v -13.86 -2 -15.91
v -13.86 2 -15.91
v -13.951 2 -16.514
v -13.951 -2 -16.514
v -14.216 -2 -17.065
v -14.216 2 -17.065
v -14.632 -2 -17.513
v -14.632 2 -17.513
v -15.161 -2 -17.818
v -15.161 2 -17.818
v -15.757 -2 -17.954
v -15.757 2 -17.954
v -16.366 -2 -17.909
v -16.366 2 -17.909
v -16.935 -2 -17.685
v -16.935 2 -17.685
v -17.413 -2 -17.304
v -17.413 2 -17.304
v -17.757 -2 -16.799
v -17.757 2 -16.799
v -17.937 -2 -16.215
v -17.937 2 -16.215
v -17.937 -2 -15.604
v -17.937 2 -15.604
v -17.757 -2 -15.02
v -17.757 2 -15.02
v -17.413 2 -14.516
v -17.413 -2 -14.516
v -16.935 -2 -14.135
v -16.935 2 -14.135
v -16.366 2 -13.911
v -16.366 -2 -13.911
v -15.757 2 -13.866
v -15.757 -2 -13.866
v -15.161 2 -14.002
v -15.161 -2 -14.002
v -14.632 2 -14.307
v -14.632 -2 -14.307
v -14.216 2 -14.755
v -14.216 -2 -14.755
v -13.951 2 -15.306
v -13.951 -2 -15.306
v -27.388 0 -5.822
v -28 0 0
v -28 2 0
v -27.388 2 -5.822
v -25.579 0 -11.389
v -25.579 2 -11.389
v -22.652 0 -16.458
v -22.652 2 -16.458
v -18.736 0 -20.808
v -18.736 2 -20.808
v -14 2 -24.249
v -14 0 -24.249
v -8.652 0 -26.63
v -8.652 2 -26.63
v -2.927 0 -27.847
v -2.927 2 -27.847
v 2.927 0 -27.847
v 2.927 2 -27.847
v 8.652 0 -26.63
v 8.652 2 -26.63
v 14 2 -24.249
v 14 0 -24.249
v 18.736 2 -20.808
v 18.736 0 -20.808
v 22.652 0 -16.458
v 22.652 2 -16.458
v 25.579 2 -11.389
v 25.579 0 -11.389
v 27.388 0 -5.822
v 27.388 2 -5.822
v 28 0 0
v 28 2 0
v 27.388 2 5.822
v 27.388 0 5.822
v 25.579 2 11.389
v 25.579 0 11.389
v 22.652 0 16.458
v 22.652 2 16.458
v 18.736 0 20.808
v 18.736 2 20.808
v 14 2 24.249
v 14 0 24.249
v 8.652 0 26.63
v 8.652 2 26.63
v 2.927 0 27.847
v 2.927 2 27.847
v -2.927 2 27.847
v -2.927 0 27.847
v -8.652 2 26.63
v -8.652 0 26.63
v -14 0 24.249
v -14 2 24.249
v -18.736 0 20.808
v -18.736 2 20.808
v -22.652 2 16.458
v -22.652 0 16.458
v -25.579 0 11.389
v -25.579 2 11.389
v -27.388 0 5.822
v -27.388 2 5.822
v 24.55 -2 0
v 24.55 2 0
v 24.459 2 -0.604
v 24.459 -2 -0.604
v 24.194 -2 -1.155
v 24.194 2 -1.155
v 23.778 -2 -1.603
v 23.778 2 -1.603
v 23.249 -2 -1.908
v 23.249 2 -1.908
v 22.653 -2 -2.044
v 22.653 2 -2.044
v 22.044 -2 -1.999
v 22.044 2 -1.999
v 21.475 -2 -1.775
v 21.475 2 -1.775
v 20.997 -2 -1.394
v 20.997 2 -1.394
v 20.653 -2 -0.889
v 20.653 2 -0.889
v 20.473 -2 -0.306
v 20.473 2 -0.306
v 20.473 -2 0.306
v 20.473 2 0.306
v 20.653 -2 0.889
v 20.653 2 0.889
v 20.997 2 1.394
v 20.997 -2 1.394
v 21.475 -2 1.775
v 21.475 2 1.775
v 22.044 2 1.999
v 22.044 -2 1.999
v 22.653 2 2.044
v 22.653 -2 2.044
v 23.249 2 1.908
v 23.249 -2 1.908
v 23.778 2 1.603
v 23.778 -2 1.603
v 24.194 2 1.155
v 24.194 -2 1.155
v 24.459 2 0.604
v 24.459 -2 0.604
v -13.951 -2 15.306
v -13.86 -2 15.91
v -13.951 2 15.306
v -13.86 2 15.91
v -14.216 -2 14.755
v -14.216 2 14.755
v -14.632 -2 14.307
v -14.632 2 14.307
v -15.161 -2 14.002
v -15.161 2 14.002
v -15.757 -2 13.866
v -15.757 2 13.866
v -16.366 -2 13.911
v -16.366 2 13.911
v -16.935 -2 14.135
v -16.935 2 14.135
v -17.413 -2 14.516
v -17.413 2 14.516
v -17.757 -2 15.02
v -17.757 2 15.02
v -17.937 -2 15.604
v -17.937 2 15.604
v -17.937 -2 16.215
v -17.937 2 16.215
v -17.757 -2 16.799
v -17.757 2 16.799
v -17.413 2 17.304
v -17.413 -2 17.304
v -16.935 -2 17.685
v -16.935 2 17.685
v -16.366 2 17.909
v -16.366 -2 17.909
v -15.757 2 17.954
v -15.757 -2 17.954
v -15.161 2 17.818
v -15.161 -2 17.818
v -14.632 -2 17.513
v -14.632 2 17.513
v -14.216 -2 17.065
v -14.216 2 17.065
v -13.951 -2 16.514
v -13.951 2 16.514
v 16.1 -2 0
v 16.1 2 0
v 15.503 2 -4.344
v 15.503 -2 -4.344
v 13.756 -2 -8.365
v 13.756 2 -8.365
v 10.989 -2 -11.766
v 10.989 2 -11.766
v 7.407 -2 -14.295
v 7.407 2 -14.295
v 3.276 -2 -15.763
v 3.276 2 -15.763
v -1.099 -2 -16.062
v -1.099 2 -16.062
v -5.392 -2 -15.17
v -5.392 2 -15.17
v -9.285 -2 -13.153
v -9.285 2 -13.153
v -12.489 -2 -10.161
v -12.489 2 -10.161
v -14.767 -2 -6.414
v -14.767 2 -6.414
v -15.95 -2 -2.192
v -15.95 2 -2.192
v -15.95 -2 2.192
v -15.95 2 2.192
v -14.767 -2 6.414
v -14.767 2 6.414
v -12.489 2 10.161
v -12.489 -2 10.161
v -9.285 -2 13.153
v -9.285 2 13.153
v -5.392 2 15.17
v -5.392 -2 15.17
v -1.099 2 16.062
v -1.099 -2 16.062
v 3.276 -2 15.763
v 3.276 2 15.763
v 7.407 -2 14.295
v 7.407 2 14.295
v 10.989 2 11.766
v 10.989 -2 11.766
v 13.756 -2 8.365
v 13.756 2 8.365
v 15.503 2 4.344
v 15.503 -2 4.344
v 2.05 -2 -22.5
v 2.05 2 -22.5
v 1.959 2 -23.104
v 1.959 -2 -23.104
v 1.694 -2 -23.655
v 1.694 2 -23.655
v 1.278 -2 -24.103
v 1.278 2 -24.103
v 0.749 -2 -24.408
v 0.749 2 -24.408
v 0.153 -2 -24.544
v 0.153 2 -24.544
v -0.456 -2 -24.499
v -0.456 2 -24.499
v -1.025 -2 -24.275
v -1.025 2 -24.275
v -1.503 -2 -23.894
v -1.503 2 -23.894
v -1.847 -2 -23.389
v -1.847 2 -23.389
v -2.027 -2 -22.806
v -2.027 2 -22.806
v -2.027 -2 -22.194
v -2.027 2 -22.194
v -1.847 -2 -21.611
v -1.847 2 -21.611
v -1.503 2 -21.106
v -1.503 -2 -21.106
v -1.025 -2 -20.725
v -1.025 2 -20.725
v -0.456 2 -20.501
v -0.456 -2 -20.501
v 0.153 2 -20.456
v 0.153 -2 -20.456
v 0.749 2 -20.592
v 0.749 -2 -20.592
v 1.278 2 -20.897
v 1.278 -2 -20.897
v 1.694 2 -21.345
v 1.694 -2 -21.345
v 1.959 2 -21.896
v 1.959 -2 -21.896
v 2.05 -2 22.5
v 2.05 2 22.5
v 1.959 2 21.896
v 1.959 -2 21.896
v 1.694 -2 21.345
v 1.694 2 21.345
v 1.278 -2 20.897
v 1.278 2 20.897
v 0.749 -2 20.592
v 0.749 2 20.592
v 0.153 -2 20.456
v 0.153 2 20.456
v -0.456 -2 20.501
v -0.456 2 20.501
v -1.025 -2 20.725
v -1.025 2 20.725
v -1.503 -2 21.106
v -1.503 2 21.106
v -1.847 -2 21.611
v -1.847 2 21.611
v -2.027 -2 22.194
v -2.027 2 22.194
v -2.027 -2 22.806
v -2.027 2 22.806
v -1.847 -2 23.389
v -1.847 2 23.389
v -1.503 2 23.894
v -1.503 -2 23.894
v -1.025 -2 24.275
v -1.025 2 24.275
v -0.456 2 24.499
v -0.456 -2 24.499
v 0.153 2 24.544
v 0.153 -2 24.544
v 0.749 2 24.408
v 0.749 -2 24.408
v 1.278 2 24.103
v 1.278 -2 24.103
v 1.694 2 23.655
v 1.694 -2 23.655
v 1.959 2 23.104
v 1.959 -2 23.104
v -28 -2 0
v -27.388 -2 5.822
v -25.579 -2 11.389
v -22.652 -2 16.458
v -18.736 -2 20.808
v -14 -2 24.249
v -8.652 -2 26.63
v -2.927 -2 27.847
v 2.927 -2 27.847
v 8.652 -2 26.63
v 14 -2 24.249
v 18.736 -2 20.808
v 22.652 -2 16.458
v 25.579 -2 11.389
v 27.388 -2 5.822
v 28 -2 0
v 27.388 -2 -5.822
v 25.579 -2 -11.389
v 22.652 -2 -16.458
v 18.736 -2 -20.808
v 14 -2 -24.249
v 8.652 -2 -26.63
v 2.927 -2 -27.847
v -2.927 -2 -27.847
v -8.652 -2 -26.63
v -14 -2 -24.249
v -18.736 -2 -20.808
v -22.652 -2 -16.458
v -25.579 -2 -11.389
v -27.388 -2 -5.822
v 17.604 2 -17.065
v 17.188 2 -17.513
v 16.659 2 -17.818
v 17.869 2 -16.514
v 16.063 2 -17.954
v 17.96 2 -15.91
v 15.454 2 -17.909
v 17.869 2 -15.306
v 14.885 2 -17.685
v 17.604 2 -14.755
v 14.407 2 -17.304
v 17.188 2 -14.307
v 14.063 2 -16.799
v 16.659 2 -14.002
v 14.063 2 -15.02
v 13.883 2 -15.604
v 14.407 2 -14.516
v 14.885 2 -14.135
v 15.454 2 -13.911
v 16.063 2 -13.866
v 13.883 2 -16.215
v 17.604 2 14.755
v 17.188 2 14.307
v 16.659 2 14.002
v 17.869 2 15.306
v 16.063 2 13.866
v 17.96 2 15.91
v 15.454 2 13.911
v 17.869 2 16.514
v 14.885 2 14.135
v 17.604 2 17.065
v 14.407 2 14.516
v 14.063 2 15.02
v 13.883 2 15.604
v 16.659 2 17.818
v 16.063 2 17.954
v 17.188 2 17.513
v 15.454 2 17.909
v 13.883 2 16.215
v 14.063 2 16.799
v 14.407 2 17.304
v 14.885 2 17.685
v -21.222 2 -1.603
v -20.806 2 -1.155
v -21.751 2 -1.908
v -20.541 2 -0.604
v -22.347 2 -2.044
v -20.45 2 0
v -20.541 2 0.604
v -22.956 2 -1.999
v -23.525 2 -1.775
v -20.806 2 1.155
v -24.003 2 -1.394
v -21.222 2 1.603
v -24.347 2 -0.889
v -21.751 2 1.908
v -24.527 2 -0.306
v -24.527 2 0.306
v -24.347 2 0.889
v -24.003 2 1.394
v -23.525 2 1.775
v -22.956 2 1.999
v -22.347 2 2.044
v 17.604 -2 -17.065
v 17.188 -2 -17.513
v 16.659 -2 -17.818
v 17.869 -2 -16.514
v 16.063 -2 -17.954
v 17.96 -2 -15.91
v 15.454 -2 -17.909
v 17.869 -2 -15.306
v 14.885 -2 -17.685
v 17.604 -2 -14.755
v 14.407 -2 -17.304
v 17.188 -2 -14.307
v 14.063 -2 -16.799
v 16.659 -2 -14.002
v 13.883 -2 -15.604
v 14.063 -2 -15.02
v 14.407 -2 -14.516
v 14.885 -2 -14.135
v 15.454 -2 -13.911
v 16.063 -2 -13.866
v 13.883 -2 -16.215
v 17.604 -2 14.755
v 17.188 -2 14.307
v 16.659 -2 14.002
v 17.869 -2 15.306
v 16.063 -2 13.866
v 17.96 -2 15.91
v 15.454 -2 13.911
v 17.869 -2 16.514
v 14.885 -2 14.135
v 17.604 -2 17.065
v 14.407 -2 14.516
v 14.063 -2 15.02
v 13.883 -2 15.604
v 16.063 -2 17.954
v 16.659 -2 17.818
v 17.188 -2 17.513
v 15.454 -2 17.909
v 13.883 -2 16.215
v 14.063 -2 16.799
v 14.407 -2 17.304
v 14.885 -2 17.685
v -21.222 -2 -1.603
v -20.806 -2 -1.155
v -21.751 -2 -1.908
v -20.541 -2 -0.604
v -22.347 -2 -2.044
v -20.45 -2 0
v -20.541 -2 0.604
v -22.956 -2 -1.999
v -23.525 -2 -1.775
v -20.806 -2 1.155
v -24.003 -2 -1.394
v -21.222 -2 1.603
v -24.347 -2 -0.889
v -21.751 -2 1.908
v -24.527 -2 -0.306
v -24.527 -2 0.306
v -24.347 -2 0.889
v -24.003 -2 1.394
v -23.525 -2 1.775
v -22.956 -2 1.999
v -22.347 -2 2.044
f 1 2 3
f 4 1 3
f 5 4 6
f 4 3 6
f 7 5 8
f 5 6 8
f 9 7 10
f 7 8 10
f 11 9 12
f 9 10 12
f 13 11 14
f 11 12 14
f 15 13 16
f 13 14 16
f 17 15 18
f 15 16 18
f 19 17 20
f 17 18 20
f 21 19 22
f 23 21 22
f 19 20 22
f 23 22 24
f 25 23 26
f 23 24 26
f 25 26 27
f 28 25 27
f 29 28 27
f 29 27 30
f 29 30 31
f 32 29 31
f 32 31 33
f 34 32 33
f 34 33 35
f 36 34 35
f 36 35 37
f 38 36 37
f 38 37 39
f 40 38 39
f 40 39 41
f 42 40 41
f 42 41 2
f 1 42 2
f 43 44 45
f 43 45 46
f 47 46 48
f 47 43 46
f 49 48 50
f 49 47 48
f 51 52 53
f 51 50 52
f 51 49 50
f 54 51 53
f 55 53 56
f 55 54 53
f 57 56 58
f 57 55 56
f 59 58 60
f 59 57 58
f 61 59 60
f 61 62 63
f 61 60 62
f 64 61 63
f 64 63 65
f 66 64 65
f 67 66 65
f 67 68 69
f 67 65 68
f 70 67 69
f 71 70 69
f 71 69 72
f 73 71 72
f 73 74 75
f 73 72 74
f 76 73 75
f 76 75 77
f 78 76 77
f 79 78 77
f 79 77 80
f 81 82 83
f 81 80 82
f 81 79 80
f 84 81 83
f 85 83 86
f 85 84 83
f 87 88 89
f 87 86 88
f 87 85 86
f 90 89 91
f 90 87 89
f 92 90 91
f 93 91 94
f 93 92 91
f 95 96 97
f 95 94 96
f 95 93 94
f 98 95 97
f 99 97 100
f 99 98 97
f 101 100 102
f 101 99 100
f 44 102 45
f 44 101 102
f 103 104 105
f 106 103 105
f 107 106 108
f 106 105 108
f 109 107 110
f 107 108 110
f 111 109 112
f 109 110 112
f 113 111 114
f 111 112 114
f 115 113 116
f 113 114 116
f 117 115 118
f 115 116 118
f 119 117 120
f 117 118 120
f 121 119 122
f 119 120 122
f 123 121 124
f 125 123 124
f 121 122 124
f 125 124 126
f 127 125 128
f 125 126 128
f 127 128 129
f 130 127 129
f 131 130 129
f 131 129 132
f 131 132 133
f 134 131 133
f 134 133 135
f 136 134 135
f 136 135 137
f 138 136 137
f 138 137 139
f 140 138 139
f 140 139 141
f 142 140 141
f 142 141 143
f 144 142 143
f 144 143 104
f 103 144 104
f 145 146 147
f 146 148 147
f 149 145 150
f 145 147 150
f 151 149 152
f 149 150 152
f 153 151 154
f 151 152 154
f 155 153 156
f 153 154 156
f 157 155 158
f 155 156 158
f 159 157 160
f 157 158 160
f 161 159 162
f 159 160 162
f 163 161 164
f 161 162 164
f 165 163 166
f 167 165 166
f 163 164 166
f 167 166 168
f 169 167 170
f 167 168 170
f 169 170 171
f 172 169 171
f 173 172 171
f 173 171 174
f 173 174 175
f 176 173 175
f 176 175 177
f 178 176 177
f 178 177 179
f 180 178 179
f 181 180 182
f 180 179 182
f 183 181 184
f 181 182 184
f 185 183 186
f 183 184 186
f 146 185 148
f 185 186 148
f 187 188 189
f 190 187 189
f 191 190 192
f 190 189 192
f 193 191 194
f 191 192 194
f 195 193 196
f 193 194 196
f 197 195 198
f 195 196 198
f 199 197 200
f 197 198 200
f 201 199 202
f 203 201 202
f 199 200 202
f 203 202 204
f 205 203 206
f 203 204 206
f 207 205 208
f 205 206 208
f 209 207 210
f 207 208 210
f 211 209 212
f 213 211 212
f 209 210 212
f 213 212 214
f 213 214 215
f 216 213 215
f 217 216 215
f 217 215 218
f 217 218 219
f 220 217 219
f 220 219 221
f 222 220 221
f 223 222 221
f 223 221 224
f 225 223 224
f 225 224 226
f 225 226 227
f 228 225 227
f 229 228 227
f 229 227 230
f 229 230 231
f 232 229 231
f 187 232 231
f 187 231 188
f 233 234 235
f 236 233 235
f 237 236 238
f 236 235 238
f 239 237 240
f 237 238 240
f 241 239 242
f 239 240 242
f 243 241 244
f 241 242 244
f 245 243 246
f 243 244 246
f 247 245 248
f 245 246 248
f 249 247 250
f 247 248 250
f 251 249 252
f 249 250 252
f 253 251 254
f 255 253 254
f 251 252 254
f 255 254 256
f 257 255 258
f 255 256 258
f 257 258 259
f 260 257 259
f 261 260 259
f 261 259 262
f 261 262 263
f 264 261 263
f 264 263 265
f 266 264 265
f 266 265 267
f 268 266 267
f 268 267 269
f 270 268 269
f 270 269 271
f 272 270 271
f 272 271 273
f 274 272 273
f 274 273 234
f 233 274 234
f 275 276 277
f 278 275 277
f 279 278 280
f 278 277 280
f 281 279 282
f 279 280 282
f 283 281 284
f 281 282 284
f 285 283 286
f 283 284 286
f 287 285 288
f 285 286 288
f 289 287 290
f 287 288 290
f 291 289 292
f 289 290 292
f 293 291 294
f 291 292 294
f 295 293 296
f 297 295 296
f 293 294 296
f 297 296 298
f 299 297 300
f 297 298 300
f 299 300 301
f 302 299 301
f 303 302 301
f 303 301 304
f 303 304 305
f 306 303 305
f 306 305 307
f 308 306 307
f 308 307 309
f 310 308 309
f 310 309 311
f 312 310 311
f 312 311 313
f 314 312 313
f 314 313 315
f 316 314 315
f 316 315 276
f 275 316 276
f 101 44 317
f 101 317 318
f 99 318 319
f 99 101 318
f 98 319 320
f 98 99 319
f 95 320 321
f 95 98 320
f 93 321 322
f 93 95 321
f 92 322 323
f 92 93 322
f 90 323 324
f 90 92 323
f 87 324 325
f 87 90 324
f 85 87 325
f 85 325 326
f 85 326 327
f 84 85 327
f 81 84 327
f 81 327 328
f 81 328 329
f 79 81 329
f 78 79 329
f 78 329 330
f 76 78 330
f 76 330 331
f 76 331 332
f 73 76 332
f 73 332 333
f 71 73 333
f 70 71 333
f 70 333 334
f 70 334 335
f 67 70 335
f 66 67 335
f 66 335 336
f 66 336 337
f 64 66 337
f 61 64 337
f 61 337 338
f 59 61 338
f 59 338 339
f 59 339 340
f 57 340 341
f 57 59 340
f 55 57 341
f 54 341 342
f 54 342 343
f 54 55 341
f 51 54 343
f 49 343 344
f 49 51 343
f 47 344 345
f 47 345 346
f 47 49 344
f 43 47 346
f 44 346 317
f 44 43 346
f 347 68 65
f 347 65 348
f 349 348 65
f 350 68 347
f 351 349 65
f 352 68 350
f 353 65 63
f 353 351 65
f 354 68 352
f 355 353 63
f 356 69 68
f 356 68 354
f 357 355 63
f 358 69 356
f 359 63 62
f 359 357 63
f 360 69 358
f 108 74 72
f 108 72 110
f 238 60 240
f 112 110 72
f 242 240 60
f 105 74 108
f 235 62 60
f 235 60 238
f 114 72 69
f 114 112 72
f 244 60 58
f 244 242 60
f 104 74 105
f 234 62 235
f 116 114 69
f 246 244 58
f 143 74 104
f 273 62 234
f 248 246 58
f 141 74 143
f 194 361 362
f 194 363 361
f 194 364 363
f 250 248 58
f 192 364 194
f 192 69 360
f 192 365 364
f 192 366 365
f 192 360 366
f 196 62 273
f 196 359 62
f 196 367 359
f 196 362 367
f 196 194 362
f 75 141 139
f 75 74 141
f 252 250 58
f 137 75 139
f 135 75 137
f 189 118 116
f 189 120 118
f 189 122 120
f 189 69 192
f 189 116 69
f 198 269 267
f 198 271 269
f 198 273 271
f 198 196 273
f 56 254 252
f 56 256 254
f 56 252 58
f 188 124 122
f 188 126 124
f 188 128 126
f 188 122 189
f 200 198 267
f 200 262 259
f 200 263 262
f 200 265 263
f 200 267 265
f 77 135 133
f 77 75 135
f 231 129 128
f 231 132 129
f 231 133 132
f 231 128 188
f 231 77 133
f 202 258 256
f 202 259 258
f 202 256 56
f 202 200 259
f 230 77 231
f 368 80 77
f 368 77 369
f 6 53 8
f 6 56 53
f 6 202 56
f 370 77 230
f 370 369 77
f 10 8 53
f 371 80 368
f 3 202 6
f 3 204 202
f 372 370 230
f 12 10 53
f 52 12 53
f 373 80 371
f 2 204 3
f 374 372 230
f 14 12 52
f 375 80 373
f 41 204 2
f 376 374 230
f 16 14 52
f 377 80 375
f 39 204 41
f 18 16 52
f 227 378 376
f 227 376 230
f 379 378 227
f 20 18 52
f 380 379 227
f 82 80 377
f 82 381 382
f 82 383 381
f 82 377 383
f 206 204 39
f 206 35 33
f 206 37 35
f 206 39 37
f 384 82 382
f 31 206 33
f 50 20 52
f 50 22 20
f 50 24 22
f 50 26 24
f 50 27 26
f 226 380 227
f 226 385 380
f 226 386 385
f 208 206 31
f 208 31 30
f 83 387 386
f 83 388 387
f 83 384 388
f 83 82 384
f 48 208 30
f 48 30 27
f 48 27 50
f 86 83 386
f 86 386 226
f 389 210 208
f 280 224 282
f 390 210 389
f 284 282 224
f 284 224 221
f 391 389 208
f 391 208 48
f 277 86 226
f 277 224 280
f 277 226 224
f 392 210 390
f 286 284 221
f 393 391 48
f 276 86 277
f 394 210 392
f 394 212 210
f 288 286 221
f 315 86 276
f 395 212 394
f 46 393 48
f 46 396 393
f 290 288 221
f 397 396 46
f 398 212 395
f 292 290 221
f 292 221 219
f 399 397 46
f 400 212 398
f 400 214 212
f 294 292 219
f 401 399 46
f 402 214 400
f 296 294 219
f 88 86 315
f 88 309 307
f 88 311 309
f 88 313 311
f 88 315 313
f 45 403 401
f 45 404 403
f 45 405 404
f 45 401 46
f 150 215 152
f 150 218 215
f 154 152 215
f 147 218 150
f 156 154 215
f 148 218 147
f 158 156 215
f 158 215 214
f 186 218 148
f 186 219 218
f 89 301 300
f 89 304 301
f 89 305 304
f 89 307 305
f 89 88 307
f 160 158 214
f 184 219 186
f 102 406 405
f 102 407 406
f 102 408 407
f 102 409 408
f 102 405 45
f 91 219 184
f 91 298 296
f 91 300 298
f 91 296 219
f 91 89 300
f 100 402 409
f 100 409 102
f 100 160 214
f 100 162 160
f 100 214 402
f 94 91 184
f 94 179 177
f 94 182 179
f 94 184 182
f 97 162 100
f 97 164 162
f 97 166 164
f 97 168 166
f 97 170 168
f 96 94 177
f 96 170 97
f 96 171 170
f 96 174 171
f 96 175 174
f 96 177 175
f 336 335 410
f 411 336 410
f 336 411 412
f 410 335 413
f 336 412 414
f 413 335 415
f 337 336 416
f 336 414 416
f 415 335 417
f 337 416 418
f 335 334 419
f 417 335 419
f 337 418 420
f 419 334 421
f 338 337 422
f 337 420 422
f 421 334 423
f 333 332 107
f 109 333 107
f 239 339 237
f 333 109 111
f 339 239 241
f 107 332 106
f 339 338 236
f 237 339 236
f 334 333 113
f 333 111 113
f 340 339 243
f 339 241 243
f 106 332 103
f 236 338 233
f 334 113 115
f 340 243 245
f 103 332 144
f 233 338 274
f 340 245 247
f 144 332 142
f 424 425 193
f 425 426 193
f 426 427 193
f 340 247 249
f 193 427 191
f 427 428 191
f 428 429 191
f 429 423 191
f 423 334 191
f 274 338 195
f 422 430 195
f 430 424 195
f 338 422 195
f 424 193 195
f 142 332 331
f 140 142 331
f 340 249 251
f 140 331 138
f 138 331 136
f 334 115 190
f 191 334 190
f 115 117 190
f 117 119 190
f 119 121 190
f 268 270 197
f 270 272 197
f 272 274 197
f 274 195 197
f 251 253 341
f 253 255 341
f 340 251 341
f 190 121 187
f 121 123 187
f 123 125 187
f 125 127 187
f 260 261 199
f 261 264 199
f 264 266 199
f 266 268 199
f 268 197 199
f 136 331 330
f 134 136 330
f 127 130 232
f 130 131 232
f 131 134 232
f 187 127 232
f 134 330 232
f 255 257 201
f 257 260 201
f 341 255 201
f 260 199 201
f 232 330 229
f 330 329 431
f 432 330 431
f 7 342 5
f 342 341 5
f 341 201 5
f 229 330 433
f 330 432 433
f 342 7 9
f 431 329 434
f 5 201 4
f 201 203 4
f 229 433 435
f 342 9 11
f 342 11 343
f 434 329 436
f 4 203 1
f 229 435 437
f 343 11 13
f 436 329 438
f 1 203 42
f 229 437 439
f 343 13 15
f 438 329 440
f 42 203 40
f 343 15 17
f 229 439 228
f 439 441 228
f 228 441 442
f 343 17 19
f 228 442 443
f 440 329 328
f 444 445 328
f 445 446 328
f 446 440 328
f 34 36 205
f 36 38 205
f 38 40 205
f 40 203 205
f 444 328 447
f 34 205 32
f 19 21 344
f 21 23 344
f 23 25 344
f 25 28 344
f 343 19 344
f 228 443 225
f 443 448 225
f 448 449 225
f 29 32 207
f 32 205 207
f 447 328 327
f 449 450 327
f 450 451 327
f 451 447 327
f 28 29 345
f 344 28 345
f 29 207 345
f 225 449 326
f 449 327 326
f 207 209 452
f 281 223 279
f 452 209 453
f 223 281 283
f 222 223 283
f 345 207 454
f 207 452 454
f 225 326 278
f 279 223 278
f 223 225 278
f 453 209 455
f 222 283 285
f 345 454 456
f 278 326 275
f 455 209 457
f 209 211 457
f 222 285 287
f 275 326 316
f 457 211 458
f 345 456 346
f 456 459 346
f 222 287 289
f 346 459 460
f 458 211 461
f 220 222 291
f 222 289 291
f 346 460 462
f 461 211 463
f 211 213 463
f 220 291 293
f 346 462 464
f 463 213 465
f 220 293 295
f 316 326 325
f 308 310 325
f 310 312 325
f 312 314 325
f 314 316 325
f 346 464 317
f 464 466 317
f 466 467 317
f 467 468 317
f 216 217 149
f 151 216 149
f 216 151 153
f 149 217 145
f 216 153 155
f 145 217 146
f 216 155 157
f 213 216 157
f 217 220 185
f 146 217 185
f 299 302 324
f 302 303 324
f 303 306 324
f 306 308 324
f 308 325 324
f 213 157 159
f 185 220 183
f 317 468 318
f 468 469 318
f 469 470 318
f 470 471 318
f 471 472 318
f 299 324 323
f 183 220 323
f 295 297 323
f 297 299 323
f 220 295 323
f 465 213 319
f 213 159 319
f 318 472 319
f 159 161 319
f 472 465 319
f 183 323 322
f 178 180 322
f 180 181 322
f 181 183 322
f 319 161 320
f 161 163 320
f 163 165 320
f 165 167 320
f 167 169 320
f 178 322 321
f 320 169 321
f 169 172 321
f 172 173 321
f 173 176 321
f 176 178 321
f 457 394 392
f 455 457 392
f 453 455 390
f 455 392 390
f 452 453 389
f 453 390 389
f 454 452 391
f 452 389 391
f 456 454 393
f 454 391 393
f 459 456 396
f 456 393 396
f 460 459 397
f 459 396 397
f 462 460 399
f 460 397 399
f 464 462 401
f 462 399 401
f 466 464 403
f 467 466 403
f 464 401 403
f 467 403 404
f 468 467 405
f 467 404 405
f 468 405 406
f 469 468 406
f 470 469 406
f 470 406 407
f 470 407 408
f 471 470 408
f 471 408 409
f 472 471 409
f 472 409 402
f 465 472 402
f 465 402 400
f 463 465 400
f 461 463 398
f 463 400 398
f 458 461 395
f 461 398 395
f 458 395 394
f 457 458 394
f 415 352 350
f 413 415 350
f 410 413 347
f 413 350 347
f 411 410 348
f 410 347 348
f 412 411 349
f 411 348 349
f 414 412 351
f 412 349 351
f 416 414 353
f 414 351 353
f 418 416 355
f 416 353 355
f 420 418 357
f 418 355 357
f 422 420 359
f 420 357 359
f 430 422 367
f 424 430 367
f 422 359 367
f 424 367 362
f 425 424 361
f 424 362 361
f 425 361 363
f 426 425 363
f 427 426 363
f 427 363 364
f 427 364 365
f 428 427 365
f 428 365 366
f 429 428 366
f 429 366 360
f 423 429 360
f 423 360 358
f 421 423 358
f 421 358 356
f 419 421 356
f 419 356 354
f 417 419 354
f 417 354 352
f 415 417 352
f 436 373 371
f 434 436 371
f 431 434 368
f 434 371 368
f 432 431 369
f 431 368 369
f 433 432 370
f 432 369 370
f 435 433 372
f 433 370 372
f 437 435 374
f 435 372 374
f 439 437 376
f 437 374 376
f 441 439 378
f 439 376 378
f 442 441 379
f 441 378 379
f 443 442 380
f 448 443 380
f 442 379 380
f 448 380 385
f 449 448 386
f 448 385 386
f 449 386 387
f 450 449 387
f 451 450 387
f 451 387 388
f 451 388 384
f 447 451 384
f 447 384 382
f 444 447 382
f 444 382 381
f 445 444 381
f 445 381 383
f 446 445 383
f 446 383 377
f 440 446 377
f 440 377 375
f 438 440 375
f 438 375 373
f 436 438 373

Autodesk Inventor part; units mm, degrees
ref_plane "YZ Plane" through (0, 0, 0) normal (1, 0, 0) x (0, 1, 0)
ref_plane "XZ Plane" through (0, 0, 0) normal (0, 1, 0) x (-1, 0, 0)
ref_plane "XY Plane" through (0, 0, 0) normal (0, 0, 1) x (1, 0, 0)
sketch "Sketch1" plane through (0, 0, 0) normal (0, 1, 0) x (-1, 0, 0)
  circle A0 centre (0, 0) radius 28
  dimension "d0" = 56
extrude "Extrusion1" add sketch "Sketch1" along normal mid plane 4
sketch "Sketch2" plane through (0, 2, 0) normal (0, 1, 0) x (1, 0, 0)
  circle A0 centre (0, 22.5) radius 2.05
  circle A1 centre (-15.9099, 15.9099) radius 2.05
  circle A2 centre (-22.5, 0) radius 2.05
  circle A3 centre (-15.9099, -15.9099) radius 2.05
  circle A4 centre (0, -22.5) radius 2.05
  circle A5 centre (15.9099, -15.9099) radius 2.05
  circle A6 centre (22.5, 0) radius 2.05
  circle A7 centre (15.9099, 15.9099) radius 2.05
  point P0 (0, 0)
  dimension "d3" = 4.1
  dimension "d4" = 22.5
  dimension "d7" = 360
extrude "Extrusion2" cut sketch "Sketch2" against normal through all
sketch "Sketch3" plane through (0, 2, 0) normal (0, 1, 0) x (1, 0, 0)
  circle A0 centre (0, 0) radius 16.1
  dimension "d11" = 32.2
extrude "Extrusion3" cut sketch "Sketch3" against normal through all
properties part number "BearingSpacerPlate"
